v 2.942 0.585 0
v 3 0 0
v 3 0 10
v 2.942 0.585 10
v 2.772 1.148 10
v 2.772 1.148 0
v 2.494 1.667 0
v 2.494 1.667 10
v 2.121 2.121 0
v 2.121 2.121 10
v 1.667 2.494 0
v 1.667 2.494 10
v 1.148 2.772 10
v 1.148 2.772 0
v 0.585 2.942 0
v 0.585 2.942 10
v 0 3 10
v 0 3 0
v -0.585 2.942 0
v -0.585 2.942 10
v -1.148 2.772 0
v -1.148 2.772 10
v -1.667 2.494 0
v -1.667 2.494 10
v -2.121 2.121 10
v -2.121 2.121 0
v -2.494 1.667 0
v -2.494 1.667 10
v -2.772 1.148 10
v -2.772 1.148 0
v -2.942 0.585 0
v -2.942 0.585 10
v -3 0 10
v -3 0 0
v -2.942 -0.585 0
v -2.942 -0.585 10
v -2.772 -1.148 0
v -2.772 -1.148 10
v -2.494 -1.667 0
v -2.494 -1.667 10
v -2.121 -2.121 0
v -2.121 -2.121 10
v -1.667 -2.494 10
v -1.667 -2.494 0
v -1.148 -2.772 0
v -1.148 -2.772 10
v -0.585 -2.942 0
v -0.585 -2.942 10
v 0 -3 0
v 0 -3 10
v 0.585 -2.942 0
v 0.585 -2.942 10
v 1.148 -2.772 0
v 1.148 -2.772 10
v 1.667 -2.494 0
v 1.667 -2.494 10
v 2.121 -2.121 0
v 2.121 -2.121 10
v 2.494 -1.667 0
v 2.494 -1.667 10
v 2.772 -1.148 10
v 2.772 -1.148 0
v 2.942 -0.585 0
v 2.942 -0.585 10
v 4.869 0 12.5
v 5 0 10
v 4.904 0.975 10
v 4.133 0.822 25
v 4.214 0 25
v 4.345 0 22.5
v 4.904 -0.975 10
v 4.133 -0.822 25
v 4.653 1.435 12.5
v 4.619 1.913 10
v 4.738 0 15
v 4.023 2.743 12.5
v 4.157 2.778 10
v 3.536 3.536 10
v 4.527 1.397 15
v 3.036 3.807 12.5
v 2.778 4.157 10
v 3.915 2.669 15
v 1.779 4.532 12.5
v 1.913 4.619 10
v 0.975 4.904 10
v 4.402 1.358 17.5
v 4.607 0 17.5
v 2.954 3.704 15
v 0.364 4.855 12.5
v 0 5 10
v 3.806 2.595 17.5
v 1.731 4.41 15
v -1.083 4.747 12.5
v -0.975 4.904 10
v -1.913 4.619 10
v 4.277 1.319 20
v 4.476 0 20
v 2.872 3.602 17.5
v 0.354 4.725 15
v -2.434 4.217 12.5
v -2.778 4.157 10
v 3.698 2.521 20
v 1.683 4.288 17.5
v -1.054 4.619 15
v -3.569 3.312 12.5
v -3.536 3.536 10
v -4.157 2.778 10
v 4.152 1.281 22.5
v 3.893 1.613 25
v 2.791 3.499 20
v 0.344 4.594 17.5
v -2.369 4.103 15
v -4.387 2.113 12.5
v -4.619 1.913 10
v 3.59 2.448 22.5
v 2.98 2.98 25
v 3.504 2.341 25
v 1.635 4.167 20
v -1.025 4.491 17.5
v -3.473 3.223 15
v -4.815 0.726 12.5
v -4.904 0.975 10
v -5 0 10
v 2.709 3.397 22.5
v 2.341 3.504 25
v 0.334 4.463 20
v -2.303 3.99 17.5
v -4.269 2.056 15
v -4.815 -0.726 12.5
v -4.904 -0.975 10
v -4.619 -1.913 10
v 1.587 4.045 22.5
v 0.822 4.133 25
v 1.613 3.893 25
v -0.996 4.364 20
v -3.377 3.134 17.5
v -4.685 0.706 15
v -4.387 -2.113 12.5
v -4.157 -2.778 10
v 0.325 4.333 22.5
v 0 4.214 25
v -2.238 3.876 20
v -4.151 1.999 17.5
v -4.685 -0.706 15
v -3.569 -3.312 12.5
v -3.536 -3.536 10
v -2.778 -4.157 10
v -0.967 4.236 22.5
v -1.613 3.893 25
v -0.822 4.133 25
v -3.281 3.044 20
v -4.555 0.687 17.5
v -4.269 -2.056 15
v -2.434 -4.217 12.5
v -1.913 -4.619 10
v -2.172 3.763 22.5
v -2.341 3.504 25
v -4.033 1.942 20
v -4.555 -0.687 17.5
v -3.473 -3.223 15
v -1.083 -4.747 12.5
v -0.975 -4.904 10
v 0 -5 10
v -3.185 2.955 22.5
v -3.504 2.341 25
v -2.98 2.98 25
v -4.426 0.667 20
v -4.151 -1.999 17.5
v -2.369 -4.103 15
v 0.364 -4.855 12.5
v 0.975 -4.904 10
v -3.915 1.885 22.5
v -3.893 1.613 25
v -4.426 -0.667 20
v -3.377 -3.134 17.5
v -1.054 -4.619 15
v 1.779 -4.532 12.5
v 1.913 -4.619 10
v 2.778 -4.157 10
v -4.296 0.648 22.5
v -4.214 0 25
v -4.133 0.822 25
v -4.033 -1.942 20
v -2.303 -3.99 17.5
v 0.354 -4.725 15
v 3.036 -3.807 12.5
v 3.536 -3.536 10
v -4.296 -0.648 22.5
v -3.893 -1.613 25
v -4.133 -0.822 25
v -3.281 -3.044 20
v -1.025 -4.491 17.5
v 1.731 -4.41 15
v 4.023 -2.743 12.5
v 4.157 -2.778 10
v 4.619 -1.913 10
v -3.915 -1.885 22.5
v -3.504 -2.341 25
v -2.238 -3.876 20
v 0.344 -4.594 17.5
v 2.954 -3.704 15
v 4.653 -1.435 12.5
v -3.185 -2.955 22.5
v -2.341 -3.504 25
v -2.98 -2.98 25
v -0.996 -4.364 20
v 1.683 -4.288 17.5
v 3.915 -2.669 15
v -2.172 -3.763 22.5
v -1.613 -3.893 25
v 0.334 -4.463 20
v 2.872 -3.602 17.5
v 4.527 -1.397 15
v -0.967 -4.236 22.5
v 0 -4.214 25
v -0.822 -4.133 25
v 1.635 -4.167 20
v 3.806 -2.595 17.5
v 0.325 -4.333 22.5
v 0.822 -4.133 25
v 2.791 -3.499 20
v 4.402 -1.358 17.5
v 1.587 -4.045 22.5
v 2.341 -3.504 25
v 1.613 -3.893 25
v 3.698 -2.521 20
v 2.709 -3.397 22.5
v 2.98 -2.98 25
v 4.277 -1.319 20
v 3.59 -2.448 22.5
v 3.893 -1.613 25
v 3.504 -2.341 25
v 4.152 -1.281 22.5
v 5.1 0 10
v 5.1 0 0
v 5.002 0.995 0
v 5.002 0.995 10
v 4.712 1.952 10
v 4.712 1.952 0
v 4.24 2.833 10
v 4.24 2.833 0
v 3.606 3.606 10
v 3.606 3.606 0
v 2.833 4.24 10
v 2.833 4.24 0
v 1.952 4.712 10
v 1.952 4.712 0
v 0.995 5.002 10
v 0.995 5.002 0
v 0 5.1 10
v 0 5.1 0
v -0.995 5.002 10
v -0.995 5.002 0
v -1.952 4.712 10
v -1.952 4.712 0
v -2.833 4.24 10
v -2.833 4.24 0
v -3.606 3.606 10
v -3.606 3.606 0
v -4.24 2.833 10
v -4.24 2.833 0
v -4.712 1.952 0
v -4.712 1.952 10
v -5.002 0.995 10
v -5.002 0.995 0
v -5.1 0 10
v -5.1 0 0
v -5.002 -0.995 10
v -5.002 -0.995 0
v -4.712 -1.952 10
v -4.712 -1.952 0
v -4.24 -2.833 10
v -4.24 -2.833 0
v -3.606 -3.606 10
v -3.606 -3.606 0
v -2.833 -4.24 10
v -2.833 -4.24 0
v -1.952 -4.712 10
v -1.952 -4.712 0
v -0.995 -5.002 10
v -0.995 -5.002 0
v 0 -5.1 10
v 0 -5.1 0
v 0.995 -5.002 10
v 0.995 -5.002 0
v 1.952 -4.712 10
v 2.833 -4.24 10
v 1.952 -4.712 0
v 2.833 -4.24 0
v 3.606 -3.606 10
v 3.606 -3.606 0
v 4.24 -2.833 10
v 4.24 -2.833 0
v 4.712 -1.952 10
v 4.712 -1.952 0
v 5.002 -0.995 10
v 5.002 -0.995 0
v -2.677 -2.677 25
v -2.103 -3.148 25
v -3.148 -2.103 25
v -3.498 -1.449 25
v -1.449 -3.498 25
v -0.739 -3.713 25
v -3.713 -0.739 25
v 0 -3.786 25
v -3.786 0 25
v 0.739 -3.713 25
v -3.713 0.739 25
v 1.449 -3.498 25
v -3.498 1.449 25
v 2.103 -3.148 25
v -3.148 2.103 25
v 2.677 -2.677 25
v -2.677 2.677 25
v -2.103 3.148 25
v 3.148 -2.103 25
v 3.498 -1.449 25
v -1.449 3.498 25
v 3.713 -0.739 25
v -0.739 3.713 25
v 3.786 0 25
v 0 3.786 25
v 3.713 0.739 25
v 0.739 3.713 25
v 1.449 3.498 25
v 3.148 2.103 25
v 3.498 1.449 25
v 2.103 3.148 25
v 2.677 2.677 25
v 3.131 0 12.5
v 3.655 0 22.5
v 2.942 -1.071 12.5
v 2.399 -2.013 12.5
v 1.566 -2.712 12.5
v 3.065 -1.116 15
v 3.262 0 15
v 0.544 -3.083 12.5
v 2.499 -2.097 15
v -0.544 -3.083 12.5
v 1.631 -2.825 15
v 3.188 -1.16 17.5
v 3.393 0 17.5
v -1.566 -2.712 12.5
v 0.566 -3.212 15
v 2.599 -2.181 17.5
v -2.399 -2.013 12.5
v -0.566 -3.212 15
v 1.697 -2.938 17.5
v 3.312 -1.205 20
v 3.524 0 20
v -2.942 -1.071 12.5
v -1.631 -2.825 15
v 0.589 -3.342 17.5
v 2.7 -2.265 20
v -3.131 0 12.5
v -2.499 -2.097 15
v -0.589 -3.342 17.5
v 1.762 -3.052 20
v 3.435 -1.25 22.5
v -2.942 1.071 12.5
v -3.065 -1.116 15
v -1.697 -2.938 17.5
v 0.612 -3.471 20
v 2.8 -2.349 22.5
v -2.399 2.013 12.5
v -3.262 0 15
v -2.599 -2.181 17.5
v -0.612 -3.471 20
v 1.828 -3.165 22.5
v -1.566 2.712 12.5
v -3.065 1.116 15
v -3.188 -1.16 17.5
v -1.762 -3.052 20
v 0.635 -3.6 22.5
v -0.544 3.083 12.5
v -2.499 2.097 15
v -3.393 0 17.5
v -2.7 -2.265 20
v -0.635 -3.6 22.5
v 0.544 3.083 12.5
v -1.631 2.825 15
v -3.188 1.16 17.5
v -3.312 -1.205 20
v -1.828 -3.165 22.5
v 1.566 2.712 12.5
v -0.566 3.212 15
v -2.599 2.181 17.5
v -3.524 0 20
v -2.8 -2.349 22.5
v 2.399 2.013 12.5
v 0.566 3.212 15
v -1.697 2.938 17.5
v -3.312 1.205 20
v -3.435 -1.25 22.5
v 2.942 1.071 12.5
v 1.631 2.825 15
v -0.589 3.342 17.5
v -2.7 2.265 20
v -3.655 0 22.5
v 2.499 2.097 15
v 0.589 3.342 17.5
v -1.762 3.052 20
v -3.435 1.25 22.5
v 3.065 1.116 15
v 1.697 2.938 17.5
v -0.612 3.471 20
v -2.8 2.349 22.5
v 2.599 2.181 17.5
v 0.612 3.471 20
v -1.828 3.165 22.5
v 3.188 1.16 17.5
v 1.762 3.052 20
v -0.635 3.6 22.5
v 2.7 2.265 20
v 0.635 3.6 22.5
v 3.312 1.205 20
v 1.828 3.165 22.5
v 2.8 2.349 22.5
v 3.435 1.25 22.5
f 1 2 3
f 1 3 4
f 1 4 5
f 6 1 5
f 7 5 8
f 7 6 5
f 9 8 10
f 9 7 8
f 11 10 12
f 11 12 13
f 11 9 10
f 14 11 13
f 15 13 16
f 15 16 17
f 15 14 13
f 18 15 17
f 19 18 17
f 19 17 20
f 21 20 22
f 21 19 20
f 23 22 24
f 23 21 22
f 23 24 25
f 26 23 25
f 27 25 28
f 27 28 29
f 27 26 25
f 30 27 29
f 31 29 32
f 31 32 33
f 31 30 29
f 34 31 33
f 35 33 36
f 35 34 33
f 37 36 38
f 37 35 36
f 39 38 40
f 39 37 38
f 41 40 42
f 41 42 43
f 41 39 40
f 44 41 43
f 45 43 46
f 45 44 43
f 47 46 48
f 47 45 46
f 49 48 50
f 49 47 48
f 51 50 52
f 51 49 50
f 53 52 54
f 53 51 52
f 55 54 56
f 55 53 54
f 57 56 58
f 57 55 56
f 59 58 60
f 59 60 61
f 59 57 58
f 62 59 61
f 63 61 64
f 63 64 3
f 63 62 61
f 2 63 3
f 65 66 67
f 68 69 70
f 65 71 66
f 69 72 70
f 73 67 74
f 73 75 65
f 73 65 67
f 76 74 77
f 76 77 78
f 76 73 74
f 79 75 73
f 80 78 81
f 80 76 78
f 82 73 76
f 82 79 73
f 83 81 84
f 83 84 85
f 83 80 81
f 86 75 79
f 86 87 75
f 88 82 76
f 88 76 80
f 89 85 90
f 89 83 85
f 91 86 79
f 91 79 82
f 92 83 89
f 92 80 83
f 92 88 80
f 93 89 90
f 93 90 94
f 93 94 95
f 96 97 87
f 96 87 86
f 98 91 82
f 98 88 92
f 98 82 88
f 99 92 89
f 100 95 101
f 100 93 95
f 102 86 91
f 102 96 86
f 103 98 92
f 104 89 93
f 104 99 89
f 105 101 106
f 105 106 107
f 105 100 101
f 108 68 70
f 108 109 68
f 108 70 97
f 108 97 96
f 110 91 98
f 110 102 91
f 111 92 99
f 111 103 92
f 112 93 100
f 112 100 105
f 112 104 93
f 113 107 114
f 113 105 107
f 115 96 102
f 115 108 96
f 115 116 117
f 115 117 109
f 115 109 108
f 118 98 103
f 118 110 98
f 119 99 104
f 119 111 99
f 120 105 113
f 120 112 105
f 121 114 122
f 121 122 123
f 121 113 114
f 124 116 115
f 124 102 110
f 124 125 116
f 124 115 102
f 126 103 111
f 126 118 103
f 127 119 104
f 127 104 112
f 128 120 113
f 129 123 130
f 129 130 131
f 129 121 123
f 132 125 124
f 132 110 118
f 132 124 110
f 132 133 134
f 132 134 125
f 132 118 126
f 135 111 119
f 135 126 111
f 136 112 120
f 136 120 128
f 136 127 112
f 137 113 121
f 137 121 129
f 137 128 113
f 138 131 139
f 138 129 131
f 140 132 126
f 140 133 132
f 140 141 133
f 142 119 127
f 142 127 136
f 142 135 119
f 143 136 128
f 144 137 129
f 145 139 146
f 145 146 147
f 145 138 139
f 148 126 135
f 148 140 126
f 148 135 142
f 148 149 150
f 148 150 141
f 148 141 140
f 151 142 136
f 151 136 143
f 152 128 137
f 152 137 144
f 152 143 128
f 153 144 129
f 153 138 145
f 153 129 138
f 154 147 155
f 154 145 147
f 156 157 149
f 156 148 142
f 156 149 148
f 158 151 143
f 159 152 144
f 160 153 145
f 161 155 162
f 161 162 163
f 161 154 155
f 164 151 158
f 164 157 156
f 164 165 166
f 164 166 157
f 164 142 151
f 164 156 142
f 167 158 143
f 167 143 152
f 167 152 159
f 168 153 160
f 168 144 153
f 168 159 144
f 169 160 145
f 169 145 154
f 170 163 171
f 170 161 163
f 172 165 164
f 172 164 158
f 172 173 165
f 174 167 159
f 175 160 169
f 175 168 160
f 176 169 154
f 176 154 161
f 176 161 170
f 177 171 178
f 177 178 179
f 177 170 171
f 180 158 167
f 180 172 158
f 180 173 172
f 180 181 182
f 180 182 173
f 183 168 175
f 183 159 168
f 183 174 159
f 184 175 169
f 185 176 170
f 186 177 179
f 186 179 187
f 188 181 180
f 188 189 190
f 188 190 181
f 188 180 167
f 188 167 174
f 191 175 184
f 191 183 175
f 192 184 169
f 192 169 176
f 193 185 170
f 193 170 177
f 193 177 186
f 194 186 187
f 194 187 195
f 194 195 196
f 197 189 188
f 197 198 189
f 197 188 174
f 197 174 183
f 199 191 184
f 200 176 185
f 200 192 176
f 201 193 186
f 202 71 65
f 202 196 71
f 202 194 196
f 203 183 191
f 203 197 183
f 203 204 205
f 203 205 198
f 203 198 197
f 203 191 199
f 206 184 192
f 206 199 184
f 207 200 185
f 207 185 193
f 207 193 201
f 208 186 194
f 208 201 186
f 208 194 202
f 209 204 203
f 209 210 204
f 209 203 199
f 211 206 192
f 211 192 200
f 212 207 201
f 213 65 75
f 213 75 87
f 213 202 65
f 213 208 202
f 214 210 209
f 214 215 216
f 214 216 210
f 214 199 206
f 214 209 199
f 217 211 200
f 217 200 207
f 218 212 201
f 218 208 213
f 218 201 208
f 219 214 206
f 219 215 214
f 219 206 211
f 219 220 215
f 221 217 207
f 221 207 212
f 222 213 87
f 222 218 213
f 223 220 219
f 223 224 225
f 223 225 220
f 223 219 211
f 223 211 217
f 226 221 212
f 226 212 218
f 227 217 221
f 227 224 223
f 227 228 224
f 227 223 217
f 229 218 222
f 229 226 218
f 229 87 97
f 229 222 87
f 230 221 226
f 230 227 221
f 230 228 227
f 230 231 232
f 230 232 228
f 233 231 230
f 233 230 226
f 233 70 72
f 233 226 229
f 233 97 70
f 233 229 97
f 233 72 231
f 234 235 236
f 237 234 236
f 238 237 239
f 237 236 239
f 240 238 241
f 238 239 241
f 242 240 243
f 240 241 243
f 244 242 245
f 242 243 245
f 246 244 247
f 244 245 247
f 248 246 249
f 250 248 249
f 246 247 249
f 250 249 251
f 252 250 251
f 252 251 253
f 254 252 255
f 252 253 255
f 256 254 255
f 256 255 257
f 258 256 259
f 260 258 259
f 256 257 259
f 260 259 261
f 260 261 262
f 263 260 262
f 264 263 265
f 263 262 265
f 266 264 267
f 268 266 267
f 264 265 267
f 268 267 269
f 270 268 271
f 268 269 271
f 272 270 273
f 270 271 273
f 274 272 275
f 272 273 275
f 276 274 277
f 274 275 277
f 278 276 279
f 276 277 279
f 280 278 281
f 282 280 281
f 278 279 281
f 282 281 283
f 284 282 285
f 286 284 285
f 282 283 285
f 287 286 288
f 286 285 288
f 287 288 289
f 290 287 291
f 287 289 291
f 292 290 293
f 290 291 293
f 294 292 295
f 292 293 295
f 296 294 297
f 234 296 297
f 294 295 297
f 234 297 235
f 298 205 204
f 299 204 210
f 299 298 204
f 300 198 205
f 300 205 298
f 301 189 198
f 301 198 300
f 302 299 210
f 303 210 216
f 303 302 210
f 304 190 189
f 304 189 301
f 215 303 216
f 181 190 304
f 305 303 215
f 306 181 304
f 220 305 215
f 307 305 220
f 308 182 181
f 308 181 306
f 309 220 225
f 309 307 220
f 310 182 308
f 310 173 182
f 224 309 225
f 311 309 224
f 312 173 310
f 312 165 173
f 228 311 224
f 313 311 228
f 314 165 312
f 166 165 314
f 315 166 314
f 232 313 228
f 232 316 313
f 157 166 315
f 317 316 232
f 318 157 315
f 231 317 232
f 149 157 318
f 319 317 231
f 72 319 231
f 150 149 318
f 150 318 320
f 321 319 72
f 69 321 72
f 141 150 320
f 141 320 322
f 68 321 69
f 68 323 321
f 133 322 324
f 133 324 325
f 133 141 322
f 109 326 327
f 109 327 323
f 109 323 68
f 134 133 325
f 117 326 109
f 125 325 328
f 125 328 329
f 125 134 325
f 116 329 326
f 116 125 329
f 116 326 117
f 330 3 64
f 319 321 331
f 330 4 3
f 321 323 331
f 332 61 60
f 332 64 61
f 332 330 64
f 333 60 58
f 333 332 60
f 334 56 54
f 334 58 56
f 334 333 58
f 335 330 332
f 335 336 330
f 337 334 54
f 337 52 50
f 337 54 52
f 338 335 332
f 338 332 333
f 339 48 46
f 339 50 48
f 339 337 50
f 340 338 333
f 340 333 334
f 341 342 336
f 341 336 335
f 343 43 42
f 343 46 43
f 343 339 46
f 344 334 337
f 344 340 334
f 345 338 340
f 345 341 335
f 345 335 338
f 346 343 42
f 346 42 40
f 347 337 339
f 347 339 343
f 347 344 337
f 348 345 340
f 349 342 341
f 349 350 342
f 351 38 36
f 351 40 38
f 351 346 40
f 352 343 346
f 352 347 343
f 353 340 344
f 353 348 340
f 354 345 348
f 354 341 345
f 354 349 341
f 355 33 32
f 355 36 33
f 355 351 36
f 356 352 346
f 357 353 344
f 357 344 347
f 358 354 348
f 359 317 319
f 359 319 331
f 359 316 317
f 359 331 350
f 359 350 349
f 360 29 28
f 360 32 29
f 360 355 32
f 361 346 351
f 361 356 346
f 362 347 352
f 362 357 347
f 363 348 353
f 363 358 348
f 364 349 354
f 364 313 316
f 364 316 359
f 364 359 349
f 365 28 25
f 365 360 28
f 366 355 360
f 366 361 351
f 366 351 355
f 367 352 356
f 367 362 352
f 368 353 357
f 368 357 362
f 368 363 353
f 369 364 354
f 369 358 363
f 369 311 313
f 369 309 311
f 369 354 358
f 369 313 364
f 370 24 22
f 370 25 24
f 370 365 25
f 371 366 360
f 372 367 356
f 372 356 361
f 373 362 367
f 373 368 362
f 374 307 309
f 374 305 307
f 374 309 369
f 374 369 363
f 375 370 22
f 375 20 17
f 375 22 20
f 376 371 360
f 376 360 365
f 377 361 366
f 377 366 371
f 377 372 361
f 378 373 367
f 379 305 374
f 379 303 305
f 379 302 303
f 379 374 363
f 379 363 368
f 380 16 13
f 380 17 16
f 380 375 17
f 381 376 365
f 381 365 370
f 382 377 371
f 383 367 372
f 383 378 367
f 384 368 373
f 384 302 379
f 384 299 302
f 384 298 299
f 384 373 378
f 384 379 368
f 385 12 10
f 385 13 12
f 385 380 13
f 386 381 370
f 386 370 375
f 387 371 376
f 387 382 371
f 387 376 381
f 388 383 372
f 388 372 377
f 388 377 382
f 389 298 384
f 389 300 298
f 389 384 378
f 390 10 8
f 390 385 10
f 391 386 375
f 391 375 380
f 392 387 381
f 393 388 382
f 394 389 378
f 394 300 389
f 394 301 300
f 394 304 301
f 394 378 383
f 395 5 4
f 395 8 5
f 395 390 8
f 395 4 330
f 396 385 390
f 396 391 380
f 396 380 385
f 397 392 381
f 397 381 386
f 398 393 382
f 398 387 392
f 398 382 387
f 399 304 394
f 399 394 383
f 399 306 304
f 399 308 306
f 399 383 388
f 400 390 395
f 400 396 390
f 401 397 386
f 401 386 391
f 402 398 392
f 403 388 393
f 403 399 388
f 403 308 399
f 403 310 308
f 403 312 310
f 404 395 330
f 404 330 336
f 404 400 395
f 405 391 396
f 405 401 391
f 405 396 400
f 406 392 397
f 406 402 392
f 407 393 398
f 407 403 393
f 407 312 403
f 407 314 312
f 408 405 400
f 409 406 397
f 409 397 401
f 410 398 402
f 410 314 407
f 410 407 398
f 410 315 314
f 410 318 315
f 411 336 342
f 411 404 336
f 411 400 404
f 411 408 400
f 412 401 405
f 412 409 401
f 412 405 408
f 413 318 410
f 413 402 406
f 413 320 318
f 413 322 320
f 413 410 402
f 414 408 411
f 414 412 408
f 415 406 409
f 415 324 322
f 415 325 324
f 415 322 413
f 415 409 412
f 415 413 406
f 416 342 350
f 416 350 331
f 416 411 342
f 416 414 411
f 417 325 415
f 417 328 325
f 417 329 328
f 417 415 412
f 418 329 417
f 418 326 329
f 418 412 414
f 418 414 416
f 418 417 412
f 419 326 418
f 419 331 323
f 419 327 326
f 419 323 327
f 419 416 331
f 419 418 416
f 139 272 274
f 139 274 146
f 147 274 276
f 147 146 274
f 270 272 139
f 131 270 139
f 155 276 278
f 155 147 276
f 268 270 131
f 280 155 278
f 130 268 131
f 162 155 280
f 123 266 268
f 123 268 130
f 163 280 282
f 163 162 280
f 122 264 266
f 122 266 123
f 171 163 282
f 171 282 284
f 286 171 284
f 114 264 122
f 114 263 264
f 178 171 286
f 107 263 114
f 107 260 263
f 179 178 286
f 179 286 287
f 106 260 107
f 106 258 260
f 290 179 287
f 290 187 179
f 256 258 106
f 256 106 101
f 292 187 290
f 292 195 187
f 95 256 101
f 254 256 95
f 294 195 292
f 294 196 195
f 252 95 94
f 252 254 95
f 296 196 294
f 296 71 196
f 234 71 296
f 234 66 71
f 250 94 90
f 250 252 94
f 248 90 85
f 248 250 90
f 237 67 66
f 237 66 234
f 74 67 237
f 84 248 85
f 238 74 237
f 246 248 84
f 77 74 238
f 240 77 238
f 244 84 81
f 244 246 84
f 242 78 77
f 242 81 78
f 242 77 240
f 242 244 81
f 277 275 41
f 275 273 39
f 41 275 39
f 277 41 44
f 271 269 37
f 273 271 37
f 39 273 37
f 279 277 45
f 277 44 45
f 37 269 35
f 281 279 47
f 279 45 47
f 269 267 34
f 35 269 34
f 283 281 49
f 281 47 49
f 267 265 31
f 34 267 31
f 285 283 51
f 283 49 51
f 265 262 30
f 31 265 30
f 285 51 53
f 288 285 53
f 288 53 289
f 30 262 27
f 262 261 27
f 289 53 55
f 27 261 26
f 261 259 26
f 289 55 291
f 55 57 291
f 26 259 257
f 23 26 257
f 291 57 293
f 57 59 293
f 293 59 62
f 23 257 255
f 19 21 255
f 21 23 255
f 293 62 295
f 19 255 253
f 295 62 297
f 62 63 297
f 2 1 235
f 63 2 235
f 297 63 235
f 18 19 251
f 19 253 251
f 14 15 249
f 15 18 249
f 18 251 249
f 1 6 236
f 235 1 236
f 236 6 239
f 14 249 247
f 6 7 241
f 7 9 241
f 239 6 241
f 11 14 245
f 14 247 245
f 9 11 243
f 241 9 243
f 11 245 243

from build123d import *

# Parameters (mm, degrees)
F0_R     = 5.1
F0_R_2   = 3
F1_DEPTH = 10
F2_R     = 5
F2_R_2   = 3
F3_DEPTH = 15
F3_TAPER = 3


with BuildPart() as f1:
    # F0 (on Top) → F1 (new body)
    with BuildSketch(Plane.XY):
        Circle(F0_R)
        Circle(F0_R_2, mode=Mode.SUBTRACT)
    extrude(amount=F1_DEPTH)

    # F2 (on face) → F3 (join)
    with BuildSketch(Plane.XY.offset(10)):
        Circle(F2_R)
        Circle(F2_R_2, mode=Mode.SUBTRACT)
    extrude(amount=F3_DEPTH, taper=F3_TAPER)


solid = f1.part
